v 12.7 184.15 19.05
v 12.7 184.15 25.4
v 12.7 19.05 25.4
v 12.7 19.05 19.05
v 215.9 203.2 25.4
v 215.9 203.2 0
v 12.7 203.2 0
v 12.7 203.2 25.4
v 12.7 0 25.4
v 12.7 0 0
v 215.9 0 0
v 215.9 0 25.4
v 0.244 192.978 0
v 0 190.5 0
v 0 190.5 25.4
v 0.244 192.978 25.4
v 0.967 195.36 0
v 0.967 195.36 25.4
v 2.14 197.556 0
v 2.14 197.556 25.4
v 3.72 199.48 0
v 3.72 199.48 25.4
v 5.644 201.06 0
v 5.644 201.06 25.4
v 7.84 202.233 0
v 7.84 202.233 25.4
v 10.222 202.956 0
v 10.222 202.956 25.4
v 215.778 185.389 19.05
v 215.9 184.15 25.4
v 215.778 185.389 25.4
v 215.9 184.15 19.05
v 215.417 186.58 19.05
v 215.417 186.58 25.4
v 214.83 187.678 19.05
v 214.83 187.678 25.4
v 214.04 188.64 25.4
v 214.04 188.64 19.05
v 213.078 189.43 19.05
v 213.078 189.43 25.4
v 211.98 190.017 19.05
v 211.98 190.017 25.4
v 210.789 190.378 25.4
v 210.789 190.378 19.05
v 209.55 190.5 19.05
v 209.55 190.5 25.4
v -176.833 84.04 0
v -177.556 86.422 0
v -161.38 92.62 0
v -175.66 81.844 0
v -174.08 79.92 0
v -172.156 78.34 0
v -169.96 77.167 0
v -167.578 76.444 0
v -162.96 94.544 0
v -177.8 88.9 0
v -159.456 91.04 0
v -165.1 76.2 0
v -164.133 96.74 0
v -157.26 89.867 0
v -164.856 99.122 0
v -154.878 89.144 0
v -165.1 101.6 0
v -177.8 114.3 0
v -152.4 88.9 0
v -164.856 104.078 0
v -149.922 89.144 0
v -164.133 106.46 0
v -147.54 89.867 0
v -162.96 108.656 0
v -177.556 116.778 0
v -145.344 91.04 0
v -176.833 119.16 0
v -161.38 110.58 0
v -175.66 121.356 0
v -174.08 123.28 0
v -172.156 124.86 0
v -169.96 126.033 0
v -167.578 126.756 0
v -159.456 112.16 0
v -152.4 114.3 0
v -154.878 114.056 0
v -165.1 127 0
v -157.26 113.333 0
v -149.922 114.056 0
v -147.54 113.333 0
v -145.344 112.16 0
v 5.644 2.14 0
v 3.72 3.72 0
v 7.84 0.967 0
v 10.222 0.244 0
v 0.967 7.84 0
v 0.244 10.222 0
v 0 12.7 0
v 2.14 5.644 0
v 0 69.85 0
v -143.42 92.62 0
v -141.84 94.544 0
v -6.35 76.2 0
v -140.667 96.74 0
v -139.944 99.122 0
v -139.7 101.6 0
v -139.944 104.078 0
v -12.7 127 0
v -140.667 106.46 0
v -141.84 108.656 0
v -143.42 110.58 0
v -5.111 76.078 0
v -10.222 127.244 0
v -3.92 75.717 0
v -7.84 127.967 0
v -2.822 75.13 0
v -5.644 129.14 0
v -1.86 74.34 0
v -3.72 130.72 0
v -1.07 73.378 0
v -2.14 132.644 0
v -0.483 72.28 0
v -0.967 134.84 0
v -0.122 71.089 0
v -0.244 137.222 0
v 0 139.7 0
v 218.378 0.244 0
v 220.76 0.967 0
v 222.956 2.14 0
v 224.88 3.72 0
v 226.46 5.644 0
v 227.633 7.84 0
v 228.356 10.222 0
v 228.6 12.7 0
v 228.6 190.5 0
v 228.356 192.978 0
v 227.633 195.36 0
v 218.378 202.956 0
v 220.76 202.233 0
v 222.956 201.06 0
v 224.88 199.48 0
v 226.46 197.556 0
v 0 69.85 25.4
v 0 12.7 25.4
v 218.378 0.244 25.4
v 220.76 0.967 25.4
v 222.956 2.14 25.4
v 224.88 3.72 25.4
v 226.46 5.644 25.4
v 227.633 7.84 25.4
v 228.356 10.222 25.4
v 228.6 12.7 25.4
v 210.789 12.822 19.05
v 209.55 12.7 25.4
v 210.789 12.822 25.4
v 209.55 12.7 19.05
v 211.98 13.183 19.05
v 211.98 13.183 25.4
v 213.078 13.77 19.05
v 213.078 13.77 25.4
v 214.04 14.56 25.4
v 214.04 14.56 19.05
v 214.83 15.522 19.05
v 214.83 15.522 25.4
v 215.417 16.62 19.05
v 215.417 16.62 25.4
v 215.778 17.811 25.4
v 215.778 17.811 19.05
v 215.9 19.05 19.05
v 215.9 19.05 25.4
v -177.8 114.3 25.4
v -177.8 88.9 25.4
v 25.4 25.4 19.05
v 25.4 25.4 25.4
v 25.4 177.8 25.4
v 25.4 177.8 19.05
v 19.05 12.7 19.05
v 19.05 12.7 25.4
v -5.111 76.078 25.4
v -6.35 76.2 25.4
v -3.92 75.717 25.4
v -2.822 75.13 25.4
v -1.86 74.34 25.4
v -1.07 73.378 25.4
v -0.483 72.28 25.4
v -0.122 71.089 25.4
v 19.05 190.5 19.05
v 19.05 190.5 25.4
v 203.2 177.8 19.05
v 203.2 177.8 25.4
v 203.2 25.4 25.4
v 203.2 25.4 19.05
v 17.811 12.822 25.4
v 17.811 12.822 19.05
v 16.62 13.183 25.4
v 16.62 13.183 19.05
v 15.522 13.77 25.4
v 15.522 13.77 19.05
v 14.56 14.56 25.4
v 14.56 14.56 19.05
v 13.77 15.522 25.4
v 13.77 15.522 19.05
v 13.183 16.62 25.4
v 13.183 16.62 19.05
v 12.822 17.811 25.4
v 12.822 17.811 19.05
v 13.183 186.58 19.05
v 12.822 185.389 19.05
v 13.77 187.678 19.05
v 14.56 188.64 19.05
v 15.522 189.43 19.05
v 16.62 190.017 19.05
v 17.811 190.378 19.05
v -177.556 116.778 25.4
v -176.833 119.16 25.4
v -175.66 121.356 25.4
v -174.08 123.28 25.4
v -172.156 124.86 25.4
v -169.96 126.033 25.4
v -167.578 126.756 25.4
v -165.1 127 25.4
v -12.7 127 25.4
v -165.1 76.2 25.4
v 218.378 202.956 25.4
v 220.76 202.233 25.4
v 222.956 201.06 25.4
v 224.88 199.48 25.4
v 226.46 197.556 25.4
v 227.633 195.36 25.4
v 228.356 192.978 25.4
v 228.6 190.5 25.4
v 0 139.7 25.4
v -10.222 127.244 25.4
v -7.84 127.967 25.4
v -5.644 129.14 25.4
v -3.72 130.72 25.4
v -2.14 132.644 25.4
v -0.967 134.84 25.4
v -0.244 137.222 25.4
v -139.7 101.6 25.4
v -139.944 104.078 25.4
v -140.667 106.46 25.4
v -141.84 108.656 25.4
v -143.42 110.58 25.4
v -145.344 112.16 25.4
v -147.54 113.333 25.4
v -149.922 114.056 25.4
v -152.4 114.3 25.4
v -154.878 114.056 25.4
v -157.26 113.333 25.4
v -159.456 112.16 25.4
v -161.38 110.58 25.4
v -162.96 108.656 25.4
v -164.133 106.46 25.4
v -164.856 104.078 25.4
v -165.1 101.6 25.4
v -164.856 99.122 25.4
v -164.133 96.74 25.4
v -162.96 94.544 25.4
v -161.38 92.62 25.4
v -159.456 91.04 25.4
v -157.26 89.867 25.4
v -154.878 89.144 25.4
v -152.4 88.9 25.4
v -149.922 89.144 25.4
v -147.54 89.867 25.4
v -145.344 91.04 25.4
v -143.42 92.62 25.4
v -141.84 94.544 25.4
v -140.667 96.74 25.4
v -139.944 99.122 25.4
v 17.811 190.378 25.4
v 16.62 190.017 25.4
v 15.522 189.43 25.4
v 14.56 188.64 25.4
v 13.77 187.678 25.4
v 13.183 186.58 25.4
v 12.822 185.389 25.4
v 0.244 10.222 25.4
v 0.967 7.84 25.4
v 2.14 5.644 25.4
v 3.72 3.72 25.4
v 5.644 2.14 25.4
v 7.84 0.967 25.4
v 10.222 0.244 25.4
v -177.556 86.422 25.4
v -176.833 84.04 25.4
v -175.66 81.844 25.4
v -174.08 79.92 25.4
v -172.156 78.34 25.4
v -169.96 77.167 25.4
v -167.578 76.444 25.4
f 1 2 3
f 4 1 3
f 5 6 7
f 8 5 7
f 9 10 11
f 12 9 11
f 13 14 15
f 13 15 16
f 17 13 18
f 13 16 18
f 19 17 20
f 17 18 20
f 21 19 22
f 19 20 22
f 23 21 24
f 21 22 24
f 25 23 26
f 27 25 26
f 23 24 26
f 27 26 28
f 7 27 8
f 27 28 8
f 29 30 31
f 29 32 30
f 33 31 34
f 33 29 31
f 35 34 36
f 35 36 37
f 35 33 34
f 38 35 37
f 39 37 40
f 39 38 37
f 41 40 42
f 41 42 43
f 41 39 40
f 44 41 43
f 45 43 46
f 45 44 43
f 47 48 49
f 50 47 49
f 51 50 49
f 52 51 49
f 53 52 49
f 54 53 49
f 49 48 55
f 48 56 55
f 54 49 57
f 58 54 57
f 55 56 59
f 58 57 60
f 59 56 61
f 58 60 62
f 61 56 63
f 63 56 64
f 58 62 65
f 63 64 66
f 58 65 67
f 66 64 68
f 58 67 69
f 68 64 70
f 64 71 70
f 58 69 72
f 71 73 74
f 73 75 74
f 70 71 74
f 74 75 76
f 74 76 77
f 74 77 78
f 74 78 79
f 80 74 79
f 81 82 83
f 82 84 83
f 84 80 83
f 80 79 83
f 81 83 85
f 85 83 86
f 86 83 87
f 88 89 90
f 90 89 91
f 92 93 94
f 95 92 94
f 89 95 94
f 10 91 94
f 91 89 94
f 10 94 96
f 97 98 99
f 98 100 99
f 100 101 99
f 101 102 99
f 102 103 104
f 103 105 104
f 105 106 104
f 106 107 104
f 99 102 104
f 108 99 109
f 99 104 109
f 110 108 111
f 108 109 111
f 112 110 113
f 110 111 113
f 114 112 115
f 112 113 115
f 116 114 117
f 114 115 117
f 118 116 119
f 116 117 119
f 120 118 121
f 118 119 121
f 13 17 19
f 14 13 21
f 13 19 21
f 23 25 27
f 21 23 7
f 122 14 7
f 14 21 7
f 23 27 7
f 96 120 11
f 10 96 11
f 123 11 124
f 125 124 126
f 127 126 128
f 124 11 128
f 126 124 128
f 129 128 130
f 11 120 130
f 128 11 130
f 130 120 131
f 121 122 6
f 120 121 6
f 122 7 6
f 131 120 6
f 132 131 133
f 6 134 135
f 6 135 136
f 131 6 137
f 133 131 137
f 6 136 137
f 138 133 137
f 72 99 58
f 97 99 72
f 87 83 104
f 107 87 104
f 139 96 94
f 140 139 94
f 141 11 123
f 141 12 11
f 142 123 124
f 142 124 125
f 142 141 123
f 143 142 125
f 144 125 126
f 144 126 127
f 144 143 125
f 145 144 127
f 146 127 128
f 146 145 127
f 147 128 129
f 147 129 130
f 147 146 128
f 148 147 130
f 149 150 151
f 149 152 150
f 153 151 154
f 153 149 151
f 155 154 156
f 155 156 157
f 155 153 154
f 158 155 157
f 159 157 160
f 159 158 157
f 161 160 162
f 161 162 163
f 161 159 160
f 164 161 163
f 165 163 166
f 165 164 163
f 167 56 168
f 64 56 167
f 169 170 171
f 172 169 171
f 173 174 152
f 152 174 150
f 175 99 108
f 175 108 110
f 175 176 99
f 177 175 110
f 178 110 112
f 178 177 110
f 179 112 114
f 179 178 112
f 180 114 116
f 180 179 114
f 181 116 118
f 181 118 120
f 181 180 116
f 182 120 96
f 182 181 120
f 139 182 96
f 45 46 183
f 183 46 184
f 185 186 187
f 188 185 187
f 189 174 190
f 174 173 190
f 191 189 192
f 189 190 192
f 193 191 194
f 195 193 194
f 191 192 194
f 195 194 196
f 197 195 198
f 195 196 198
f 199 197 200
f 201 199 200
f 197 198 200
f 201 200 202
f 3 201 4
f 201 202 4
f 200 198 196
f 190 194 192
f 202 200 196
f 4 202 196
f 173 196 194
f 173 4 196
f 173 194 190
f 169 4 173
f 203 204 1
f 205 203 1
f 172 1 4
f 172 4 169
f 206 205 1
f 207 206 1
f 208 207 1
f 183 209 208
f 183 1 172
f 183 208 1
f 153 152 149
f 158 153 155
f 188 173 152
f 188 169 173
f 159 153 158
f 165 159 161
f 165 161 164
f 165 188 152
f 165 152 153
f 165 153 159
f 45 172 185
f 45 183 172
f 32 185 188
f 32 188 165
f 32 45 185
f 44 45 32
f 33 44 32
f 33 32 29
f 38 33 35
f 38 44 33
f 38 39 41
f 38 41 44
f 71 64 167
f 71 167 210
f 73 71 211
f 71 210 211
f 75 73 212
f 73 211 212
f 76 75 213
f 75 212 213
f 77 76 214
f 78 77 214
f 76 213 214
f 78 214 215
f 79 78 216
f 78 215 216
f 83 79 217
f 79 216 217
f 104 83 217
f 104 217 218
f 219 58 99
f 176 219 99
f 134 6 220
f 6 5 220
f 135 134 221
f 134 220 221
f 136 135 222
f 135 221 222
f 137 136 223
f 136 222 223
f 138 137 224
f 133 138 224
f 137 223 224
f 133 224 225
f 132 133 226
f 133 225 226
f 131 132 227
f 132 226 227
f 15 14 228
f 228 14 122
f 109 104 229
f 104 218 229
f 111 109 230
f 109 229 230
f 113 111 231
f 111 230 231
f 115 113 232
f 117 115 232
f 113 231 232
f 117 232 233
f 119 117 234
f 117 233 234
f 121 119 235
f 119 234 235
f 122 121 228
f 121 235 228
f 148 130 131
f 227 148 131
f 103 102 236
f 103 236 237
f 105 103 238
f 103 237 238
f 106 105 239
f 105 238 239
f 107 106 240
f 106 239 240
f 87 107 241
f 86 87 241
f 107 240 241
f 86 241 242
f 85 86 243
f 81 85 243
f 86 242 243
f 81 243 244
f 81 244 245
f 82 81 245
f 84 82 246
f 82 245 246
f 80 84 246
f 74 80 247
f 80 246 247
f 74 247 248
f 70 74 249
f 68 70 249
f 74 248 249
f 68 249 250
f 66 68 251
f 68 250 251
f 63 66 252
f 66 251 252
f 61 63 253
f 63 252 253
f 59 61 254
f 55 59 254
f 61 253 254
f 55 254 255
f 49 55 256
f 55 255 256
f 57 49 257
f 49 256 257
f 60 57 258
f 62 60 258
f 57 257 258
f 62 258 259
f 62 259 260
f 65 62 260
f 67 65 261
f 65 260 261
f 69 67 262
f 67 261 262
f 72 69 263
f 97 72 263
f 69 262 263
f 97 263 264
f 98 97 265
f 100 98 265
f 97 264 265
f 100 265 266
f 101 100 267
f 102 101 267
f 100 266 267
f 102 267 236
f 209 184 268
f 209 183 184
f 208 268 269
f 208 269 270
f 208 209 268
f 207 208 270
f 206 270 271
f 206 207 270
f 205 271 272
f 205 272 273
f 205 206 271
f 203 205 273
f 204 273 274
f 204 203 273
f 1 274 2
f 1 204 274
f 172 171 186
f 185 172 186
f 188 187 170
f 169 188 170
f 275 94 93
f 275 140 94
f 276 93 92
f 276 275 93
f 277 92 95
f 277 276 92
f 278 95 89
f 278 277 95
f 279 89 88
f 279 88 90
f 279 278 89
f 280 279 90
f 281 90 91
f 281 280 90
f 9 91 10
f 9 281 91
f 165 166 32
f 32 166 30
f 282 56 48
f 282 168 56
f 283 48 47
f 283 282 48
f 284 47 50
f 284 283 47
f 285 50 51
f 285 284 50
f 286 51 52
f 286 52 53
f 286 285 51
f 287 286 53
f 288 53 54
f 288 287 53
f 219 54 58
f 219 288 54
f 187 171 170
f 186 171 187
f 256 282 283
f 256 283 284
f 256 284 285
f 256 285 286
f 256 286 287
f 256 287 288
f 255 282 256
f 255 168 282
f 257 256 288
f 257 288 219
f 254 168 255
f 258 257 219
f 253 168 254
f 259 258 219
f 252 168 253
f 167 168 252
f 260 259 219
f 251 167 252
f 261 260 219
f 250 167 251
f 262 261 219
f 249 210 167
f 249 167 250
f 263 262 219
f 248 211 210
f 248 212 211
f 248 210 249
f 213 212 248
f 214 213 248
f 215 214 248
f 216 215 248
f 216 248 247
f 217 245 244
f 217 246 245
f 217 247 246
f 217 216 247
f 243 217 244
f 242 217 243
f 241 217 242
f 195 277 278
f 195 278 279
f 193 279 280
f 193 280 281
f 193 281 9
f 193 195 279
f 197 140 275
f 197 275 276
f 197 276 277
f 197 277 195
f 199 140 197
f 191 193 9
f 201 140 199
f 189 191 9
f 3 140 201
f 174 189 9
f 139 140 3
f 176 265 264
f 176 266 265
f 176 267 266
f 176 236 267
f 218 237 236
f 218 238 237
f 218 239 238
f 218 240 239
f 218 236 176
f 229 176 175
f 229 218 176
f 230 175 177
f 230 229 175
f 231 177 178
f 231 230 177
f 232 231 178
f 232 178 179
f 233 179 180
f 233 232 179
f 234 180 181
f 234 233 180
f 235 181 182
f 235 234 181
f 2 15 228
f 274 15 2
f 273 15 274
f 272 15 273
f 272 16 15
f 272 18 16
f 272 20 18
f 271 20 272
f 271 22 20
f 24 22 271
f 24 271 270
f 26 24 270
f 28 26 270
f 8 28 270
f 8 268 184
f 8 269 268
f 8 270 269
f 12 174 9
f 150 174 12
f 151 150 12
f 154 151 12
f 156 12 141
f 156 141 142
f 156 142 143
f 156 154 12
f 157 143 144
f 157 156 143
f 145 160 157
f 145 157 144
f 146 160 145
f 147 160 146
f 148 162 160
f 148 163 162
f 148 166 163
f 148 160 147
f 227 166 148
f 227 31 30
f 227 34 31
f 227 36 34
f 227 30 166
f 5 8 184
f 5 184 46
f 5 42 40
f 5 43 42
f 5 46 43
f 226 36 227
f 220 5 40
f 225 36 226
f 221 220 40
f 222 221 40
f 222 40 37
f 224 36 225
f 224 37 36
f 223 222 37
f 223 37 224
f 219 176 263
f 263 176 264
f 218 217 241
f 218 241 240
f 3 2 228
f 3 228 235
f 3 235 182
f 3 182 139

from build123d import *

# Parameters (mm, degrees)
F0_W     = 177.8
F0_H     = 50.8
F1_DEPTH = 25.4
F2_R     = 12.7
F3_DEPTH = 25.4
F5_DEPTH = 6.35
F6_R     = 6.35
F7_R     = 12.7
F8_R     = 6.35


with BuildPart() as f1:
    # F0 (on Top) → F1 (new body)
    with BuildSketch(Plane.XY):
        with Locations((-88.9, 101.6)):
            Rectangle(F0_W, F0_H)
        Polygon((0, 76.2), (0, 0), (228.6, 0), (228.6, 203.2), (0, 203.2), (0, 127), align=None)
    extrude(amount=F1_DEPTH)

    # F2 (on face) → F3 (cut)
    with BuildSketch(Plane.XY.offset(25.4)):
        with Locations((-152.4, 101.6)):
            Circle(F2_R)
    extrude(amount=-F3_DEPTH, mode=Mode.SUBTRACT)

    # F4 (on face) → F5 (cut)
    with BuildSketch(Plane.XY.offset(25.4)):
        Polygon((12.699994, 76.2), (12.699994, 12.699994), (215.900006, 12.699994), (215.900006, 190.500006), (12.699994, 190.500006), (12.699994, 127), align=None)
        Polygon((25.399994, 76.2), (25.399994, 127), (25.399994, 177.800006), (203.200006, 177.800006), (203.200006, 25.399994), (25.399994, 25.399994), align=None, mode=Mode.SUBTRACT)
    extrude(amount=-F5_DEPTH, mode=Mode.SUBTRACT)

    # F6
    f6_edges = [f1.edges().sort_by_distance(p)[0] for p in [
        (12.699994, 190.500006, 22.225),
        (215.900006, 190.500006, 22.225),
        (12.699994, 12.699994, 22.225),
        (215.900006, 12.699994, 22.225),
    ]]
    fillet(f6_edges, radius=F6_R)

    # F7
    f7_edges = [f1.edges().sort_by_distance(p)[0] for p in [
        (0, 203.2, 12.7),
        (0, 127, 12.7),
        (-177.8, 127, 12.7),
        (-177.8, 76.2, 12.7),
        (228.6, 203.2, 12.7),
        (228.6, 0, 12.7),
        (0, 0, 12.7),
    ]]
    fillet(f7_edges, radius=F7_R)

    # F8
    f8_edges = [f1.edges().sort_by_distance(p)[0] for p in [
        (0, 76.2, 12.7),
    ]]
    fillet(f8_edges, radius=F8_R)


solid = f1.part
